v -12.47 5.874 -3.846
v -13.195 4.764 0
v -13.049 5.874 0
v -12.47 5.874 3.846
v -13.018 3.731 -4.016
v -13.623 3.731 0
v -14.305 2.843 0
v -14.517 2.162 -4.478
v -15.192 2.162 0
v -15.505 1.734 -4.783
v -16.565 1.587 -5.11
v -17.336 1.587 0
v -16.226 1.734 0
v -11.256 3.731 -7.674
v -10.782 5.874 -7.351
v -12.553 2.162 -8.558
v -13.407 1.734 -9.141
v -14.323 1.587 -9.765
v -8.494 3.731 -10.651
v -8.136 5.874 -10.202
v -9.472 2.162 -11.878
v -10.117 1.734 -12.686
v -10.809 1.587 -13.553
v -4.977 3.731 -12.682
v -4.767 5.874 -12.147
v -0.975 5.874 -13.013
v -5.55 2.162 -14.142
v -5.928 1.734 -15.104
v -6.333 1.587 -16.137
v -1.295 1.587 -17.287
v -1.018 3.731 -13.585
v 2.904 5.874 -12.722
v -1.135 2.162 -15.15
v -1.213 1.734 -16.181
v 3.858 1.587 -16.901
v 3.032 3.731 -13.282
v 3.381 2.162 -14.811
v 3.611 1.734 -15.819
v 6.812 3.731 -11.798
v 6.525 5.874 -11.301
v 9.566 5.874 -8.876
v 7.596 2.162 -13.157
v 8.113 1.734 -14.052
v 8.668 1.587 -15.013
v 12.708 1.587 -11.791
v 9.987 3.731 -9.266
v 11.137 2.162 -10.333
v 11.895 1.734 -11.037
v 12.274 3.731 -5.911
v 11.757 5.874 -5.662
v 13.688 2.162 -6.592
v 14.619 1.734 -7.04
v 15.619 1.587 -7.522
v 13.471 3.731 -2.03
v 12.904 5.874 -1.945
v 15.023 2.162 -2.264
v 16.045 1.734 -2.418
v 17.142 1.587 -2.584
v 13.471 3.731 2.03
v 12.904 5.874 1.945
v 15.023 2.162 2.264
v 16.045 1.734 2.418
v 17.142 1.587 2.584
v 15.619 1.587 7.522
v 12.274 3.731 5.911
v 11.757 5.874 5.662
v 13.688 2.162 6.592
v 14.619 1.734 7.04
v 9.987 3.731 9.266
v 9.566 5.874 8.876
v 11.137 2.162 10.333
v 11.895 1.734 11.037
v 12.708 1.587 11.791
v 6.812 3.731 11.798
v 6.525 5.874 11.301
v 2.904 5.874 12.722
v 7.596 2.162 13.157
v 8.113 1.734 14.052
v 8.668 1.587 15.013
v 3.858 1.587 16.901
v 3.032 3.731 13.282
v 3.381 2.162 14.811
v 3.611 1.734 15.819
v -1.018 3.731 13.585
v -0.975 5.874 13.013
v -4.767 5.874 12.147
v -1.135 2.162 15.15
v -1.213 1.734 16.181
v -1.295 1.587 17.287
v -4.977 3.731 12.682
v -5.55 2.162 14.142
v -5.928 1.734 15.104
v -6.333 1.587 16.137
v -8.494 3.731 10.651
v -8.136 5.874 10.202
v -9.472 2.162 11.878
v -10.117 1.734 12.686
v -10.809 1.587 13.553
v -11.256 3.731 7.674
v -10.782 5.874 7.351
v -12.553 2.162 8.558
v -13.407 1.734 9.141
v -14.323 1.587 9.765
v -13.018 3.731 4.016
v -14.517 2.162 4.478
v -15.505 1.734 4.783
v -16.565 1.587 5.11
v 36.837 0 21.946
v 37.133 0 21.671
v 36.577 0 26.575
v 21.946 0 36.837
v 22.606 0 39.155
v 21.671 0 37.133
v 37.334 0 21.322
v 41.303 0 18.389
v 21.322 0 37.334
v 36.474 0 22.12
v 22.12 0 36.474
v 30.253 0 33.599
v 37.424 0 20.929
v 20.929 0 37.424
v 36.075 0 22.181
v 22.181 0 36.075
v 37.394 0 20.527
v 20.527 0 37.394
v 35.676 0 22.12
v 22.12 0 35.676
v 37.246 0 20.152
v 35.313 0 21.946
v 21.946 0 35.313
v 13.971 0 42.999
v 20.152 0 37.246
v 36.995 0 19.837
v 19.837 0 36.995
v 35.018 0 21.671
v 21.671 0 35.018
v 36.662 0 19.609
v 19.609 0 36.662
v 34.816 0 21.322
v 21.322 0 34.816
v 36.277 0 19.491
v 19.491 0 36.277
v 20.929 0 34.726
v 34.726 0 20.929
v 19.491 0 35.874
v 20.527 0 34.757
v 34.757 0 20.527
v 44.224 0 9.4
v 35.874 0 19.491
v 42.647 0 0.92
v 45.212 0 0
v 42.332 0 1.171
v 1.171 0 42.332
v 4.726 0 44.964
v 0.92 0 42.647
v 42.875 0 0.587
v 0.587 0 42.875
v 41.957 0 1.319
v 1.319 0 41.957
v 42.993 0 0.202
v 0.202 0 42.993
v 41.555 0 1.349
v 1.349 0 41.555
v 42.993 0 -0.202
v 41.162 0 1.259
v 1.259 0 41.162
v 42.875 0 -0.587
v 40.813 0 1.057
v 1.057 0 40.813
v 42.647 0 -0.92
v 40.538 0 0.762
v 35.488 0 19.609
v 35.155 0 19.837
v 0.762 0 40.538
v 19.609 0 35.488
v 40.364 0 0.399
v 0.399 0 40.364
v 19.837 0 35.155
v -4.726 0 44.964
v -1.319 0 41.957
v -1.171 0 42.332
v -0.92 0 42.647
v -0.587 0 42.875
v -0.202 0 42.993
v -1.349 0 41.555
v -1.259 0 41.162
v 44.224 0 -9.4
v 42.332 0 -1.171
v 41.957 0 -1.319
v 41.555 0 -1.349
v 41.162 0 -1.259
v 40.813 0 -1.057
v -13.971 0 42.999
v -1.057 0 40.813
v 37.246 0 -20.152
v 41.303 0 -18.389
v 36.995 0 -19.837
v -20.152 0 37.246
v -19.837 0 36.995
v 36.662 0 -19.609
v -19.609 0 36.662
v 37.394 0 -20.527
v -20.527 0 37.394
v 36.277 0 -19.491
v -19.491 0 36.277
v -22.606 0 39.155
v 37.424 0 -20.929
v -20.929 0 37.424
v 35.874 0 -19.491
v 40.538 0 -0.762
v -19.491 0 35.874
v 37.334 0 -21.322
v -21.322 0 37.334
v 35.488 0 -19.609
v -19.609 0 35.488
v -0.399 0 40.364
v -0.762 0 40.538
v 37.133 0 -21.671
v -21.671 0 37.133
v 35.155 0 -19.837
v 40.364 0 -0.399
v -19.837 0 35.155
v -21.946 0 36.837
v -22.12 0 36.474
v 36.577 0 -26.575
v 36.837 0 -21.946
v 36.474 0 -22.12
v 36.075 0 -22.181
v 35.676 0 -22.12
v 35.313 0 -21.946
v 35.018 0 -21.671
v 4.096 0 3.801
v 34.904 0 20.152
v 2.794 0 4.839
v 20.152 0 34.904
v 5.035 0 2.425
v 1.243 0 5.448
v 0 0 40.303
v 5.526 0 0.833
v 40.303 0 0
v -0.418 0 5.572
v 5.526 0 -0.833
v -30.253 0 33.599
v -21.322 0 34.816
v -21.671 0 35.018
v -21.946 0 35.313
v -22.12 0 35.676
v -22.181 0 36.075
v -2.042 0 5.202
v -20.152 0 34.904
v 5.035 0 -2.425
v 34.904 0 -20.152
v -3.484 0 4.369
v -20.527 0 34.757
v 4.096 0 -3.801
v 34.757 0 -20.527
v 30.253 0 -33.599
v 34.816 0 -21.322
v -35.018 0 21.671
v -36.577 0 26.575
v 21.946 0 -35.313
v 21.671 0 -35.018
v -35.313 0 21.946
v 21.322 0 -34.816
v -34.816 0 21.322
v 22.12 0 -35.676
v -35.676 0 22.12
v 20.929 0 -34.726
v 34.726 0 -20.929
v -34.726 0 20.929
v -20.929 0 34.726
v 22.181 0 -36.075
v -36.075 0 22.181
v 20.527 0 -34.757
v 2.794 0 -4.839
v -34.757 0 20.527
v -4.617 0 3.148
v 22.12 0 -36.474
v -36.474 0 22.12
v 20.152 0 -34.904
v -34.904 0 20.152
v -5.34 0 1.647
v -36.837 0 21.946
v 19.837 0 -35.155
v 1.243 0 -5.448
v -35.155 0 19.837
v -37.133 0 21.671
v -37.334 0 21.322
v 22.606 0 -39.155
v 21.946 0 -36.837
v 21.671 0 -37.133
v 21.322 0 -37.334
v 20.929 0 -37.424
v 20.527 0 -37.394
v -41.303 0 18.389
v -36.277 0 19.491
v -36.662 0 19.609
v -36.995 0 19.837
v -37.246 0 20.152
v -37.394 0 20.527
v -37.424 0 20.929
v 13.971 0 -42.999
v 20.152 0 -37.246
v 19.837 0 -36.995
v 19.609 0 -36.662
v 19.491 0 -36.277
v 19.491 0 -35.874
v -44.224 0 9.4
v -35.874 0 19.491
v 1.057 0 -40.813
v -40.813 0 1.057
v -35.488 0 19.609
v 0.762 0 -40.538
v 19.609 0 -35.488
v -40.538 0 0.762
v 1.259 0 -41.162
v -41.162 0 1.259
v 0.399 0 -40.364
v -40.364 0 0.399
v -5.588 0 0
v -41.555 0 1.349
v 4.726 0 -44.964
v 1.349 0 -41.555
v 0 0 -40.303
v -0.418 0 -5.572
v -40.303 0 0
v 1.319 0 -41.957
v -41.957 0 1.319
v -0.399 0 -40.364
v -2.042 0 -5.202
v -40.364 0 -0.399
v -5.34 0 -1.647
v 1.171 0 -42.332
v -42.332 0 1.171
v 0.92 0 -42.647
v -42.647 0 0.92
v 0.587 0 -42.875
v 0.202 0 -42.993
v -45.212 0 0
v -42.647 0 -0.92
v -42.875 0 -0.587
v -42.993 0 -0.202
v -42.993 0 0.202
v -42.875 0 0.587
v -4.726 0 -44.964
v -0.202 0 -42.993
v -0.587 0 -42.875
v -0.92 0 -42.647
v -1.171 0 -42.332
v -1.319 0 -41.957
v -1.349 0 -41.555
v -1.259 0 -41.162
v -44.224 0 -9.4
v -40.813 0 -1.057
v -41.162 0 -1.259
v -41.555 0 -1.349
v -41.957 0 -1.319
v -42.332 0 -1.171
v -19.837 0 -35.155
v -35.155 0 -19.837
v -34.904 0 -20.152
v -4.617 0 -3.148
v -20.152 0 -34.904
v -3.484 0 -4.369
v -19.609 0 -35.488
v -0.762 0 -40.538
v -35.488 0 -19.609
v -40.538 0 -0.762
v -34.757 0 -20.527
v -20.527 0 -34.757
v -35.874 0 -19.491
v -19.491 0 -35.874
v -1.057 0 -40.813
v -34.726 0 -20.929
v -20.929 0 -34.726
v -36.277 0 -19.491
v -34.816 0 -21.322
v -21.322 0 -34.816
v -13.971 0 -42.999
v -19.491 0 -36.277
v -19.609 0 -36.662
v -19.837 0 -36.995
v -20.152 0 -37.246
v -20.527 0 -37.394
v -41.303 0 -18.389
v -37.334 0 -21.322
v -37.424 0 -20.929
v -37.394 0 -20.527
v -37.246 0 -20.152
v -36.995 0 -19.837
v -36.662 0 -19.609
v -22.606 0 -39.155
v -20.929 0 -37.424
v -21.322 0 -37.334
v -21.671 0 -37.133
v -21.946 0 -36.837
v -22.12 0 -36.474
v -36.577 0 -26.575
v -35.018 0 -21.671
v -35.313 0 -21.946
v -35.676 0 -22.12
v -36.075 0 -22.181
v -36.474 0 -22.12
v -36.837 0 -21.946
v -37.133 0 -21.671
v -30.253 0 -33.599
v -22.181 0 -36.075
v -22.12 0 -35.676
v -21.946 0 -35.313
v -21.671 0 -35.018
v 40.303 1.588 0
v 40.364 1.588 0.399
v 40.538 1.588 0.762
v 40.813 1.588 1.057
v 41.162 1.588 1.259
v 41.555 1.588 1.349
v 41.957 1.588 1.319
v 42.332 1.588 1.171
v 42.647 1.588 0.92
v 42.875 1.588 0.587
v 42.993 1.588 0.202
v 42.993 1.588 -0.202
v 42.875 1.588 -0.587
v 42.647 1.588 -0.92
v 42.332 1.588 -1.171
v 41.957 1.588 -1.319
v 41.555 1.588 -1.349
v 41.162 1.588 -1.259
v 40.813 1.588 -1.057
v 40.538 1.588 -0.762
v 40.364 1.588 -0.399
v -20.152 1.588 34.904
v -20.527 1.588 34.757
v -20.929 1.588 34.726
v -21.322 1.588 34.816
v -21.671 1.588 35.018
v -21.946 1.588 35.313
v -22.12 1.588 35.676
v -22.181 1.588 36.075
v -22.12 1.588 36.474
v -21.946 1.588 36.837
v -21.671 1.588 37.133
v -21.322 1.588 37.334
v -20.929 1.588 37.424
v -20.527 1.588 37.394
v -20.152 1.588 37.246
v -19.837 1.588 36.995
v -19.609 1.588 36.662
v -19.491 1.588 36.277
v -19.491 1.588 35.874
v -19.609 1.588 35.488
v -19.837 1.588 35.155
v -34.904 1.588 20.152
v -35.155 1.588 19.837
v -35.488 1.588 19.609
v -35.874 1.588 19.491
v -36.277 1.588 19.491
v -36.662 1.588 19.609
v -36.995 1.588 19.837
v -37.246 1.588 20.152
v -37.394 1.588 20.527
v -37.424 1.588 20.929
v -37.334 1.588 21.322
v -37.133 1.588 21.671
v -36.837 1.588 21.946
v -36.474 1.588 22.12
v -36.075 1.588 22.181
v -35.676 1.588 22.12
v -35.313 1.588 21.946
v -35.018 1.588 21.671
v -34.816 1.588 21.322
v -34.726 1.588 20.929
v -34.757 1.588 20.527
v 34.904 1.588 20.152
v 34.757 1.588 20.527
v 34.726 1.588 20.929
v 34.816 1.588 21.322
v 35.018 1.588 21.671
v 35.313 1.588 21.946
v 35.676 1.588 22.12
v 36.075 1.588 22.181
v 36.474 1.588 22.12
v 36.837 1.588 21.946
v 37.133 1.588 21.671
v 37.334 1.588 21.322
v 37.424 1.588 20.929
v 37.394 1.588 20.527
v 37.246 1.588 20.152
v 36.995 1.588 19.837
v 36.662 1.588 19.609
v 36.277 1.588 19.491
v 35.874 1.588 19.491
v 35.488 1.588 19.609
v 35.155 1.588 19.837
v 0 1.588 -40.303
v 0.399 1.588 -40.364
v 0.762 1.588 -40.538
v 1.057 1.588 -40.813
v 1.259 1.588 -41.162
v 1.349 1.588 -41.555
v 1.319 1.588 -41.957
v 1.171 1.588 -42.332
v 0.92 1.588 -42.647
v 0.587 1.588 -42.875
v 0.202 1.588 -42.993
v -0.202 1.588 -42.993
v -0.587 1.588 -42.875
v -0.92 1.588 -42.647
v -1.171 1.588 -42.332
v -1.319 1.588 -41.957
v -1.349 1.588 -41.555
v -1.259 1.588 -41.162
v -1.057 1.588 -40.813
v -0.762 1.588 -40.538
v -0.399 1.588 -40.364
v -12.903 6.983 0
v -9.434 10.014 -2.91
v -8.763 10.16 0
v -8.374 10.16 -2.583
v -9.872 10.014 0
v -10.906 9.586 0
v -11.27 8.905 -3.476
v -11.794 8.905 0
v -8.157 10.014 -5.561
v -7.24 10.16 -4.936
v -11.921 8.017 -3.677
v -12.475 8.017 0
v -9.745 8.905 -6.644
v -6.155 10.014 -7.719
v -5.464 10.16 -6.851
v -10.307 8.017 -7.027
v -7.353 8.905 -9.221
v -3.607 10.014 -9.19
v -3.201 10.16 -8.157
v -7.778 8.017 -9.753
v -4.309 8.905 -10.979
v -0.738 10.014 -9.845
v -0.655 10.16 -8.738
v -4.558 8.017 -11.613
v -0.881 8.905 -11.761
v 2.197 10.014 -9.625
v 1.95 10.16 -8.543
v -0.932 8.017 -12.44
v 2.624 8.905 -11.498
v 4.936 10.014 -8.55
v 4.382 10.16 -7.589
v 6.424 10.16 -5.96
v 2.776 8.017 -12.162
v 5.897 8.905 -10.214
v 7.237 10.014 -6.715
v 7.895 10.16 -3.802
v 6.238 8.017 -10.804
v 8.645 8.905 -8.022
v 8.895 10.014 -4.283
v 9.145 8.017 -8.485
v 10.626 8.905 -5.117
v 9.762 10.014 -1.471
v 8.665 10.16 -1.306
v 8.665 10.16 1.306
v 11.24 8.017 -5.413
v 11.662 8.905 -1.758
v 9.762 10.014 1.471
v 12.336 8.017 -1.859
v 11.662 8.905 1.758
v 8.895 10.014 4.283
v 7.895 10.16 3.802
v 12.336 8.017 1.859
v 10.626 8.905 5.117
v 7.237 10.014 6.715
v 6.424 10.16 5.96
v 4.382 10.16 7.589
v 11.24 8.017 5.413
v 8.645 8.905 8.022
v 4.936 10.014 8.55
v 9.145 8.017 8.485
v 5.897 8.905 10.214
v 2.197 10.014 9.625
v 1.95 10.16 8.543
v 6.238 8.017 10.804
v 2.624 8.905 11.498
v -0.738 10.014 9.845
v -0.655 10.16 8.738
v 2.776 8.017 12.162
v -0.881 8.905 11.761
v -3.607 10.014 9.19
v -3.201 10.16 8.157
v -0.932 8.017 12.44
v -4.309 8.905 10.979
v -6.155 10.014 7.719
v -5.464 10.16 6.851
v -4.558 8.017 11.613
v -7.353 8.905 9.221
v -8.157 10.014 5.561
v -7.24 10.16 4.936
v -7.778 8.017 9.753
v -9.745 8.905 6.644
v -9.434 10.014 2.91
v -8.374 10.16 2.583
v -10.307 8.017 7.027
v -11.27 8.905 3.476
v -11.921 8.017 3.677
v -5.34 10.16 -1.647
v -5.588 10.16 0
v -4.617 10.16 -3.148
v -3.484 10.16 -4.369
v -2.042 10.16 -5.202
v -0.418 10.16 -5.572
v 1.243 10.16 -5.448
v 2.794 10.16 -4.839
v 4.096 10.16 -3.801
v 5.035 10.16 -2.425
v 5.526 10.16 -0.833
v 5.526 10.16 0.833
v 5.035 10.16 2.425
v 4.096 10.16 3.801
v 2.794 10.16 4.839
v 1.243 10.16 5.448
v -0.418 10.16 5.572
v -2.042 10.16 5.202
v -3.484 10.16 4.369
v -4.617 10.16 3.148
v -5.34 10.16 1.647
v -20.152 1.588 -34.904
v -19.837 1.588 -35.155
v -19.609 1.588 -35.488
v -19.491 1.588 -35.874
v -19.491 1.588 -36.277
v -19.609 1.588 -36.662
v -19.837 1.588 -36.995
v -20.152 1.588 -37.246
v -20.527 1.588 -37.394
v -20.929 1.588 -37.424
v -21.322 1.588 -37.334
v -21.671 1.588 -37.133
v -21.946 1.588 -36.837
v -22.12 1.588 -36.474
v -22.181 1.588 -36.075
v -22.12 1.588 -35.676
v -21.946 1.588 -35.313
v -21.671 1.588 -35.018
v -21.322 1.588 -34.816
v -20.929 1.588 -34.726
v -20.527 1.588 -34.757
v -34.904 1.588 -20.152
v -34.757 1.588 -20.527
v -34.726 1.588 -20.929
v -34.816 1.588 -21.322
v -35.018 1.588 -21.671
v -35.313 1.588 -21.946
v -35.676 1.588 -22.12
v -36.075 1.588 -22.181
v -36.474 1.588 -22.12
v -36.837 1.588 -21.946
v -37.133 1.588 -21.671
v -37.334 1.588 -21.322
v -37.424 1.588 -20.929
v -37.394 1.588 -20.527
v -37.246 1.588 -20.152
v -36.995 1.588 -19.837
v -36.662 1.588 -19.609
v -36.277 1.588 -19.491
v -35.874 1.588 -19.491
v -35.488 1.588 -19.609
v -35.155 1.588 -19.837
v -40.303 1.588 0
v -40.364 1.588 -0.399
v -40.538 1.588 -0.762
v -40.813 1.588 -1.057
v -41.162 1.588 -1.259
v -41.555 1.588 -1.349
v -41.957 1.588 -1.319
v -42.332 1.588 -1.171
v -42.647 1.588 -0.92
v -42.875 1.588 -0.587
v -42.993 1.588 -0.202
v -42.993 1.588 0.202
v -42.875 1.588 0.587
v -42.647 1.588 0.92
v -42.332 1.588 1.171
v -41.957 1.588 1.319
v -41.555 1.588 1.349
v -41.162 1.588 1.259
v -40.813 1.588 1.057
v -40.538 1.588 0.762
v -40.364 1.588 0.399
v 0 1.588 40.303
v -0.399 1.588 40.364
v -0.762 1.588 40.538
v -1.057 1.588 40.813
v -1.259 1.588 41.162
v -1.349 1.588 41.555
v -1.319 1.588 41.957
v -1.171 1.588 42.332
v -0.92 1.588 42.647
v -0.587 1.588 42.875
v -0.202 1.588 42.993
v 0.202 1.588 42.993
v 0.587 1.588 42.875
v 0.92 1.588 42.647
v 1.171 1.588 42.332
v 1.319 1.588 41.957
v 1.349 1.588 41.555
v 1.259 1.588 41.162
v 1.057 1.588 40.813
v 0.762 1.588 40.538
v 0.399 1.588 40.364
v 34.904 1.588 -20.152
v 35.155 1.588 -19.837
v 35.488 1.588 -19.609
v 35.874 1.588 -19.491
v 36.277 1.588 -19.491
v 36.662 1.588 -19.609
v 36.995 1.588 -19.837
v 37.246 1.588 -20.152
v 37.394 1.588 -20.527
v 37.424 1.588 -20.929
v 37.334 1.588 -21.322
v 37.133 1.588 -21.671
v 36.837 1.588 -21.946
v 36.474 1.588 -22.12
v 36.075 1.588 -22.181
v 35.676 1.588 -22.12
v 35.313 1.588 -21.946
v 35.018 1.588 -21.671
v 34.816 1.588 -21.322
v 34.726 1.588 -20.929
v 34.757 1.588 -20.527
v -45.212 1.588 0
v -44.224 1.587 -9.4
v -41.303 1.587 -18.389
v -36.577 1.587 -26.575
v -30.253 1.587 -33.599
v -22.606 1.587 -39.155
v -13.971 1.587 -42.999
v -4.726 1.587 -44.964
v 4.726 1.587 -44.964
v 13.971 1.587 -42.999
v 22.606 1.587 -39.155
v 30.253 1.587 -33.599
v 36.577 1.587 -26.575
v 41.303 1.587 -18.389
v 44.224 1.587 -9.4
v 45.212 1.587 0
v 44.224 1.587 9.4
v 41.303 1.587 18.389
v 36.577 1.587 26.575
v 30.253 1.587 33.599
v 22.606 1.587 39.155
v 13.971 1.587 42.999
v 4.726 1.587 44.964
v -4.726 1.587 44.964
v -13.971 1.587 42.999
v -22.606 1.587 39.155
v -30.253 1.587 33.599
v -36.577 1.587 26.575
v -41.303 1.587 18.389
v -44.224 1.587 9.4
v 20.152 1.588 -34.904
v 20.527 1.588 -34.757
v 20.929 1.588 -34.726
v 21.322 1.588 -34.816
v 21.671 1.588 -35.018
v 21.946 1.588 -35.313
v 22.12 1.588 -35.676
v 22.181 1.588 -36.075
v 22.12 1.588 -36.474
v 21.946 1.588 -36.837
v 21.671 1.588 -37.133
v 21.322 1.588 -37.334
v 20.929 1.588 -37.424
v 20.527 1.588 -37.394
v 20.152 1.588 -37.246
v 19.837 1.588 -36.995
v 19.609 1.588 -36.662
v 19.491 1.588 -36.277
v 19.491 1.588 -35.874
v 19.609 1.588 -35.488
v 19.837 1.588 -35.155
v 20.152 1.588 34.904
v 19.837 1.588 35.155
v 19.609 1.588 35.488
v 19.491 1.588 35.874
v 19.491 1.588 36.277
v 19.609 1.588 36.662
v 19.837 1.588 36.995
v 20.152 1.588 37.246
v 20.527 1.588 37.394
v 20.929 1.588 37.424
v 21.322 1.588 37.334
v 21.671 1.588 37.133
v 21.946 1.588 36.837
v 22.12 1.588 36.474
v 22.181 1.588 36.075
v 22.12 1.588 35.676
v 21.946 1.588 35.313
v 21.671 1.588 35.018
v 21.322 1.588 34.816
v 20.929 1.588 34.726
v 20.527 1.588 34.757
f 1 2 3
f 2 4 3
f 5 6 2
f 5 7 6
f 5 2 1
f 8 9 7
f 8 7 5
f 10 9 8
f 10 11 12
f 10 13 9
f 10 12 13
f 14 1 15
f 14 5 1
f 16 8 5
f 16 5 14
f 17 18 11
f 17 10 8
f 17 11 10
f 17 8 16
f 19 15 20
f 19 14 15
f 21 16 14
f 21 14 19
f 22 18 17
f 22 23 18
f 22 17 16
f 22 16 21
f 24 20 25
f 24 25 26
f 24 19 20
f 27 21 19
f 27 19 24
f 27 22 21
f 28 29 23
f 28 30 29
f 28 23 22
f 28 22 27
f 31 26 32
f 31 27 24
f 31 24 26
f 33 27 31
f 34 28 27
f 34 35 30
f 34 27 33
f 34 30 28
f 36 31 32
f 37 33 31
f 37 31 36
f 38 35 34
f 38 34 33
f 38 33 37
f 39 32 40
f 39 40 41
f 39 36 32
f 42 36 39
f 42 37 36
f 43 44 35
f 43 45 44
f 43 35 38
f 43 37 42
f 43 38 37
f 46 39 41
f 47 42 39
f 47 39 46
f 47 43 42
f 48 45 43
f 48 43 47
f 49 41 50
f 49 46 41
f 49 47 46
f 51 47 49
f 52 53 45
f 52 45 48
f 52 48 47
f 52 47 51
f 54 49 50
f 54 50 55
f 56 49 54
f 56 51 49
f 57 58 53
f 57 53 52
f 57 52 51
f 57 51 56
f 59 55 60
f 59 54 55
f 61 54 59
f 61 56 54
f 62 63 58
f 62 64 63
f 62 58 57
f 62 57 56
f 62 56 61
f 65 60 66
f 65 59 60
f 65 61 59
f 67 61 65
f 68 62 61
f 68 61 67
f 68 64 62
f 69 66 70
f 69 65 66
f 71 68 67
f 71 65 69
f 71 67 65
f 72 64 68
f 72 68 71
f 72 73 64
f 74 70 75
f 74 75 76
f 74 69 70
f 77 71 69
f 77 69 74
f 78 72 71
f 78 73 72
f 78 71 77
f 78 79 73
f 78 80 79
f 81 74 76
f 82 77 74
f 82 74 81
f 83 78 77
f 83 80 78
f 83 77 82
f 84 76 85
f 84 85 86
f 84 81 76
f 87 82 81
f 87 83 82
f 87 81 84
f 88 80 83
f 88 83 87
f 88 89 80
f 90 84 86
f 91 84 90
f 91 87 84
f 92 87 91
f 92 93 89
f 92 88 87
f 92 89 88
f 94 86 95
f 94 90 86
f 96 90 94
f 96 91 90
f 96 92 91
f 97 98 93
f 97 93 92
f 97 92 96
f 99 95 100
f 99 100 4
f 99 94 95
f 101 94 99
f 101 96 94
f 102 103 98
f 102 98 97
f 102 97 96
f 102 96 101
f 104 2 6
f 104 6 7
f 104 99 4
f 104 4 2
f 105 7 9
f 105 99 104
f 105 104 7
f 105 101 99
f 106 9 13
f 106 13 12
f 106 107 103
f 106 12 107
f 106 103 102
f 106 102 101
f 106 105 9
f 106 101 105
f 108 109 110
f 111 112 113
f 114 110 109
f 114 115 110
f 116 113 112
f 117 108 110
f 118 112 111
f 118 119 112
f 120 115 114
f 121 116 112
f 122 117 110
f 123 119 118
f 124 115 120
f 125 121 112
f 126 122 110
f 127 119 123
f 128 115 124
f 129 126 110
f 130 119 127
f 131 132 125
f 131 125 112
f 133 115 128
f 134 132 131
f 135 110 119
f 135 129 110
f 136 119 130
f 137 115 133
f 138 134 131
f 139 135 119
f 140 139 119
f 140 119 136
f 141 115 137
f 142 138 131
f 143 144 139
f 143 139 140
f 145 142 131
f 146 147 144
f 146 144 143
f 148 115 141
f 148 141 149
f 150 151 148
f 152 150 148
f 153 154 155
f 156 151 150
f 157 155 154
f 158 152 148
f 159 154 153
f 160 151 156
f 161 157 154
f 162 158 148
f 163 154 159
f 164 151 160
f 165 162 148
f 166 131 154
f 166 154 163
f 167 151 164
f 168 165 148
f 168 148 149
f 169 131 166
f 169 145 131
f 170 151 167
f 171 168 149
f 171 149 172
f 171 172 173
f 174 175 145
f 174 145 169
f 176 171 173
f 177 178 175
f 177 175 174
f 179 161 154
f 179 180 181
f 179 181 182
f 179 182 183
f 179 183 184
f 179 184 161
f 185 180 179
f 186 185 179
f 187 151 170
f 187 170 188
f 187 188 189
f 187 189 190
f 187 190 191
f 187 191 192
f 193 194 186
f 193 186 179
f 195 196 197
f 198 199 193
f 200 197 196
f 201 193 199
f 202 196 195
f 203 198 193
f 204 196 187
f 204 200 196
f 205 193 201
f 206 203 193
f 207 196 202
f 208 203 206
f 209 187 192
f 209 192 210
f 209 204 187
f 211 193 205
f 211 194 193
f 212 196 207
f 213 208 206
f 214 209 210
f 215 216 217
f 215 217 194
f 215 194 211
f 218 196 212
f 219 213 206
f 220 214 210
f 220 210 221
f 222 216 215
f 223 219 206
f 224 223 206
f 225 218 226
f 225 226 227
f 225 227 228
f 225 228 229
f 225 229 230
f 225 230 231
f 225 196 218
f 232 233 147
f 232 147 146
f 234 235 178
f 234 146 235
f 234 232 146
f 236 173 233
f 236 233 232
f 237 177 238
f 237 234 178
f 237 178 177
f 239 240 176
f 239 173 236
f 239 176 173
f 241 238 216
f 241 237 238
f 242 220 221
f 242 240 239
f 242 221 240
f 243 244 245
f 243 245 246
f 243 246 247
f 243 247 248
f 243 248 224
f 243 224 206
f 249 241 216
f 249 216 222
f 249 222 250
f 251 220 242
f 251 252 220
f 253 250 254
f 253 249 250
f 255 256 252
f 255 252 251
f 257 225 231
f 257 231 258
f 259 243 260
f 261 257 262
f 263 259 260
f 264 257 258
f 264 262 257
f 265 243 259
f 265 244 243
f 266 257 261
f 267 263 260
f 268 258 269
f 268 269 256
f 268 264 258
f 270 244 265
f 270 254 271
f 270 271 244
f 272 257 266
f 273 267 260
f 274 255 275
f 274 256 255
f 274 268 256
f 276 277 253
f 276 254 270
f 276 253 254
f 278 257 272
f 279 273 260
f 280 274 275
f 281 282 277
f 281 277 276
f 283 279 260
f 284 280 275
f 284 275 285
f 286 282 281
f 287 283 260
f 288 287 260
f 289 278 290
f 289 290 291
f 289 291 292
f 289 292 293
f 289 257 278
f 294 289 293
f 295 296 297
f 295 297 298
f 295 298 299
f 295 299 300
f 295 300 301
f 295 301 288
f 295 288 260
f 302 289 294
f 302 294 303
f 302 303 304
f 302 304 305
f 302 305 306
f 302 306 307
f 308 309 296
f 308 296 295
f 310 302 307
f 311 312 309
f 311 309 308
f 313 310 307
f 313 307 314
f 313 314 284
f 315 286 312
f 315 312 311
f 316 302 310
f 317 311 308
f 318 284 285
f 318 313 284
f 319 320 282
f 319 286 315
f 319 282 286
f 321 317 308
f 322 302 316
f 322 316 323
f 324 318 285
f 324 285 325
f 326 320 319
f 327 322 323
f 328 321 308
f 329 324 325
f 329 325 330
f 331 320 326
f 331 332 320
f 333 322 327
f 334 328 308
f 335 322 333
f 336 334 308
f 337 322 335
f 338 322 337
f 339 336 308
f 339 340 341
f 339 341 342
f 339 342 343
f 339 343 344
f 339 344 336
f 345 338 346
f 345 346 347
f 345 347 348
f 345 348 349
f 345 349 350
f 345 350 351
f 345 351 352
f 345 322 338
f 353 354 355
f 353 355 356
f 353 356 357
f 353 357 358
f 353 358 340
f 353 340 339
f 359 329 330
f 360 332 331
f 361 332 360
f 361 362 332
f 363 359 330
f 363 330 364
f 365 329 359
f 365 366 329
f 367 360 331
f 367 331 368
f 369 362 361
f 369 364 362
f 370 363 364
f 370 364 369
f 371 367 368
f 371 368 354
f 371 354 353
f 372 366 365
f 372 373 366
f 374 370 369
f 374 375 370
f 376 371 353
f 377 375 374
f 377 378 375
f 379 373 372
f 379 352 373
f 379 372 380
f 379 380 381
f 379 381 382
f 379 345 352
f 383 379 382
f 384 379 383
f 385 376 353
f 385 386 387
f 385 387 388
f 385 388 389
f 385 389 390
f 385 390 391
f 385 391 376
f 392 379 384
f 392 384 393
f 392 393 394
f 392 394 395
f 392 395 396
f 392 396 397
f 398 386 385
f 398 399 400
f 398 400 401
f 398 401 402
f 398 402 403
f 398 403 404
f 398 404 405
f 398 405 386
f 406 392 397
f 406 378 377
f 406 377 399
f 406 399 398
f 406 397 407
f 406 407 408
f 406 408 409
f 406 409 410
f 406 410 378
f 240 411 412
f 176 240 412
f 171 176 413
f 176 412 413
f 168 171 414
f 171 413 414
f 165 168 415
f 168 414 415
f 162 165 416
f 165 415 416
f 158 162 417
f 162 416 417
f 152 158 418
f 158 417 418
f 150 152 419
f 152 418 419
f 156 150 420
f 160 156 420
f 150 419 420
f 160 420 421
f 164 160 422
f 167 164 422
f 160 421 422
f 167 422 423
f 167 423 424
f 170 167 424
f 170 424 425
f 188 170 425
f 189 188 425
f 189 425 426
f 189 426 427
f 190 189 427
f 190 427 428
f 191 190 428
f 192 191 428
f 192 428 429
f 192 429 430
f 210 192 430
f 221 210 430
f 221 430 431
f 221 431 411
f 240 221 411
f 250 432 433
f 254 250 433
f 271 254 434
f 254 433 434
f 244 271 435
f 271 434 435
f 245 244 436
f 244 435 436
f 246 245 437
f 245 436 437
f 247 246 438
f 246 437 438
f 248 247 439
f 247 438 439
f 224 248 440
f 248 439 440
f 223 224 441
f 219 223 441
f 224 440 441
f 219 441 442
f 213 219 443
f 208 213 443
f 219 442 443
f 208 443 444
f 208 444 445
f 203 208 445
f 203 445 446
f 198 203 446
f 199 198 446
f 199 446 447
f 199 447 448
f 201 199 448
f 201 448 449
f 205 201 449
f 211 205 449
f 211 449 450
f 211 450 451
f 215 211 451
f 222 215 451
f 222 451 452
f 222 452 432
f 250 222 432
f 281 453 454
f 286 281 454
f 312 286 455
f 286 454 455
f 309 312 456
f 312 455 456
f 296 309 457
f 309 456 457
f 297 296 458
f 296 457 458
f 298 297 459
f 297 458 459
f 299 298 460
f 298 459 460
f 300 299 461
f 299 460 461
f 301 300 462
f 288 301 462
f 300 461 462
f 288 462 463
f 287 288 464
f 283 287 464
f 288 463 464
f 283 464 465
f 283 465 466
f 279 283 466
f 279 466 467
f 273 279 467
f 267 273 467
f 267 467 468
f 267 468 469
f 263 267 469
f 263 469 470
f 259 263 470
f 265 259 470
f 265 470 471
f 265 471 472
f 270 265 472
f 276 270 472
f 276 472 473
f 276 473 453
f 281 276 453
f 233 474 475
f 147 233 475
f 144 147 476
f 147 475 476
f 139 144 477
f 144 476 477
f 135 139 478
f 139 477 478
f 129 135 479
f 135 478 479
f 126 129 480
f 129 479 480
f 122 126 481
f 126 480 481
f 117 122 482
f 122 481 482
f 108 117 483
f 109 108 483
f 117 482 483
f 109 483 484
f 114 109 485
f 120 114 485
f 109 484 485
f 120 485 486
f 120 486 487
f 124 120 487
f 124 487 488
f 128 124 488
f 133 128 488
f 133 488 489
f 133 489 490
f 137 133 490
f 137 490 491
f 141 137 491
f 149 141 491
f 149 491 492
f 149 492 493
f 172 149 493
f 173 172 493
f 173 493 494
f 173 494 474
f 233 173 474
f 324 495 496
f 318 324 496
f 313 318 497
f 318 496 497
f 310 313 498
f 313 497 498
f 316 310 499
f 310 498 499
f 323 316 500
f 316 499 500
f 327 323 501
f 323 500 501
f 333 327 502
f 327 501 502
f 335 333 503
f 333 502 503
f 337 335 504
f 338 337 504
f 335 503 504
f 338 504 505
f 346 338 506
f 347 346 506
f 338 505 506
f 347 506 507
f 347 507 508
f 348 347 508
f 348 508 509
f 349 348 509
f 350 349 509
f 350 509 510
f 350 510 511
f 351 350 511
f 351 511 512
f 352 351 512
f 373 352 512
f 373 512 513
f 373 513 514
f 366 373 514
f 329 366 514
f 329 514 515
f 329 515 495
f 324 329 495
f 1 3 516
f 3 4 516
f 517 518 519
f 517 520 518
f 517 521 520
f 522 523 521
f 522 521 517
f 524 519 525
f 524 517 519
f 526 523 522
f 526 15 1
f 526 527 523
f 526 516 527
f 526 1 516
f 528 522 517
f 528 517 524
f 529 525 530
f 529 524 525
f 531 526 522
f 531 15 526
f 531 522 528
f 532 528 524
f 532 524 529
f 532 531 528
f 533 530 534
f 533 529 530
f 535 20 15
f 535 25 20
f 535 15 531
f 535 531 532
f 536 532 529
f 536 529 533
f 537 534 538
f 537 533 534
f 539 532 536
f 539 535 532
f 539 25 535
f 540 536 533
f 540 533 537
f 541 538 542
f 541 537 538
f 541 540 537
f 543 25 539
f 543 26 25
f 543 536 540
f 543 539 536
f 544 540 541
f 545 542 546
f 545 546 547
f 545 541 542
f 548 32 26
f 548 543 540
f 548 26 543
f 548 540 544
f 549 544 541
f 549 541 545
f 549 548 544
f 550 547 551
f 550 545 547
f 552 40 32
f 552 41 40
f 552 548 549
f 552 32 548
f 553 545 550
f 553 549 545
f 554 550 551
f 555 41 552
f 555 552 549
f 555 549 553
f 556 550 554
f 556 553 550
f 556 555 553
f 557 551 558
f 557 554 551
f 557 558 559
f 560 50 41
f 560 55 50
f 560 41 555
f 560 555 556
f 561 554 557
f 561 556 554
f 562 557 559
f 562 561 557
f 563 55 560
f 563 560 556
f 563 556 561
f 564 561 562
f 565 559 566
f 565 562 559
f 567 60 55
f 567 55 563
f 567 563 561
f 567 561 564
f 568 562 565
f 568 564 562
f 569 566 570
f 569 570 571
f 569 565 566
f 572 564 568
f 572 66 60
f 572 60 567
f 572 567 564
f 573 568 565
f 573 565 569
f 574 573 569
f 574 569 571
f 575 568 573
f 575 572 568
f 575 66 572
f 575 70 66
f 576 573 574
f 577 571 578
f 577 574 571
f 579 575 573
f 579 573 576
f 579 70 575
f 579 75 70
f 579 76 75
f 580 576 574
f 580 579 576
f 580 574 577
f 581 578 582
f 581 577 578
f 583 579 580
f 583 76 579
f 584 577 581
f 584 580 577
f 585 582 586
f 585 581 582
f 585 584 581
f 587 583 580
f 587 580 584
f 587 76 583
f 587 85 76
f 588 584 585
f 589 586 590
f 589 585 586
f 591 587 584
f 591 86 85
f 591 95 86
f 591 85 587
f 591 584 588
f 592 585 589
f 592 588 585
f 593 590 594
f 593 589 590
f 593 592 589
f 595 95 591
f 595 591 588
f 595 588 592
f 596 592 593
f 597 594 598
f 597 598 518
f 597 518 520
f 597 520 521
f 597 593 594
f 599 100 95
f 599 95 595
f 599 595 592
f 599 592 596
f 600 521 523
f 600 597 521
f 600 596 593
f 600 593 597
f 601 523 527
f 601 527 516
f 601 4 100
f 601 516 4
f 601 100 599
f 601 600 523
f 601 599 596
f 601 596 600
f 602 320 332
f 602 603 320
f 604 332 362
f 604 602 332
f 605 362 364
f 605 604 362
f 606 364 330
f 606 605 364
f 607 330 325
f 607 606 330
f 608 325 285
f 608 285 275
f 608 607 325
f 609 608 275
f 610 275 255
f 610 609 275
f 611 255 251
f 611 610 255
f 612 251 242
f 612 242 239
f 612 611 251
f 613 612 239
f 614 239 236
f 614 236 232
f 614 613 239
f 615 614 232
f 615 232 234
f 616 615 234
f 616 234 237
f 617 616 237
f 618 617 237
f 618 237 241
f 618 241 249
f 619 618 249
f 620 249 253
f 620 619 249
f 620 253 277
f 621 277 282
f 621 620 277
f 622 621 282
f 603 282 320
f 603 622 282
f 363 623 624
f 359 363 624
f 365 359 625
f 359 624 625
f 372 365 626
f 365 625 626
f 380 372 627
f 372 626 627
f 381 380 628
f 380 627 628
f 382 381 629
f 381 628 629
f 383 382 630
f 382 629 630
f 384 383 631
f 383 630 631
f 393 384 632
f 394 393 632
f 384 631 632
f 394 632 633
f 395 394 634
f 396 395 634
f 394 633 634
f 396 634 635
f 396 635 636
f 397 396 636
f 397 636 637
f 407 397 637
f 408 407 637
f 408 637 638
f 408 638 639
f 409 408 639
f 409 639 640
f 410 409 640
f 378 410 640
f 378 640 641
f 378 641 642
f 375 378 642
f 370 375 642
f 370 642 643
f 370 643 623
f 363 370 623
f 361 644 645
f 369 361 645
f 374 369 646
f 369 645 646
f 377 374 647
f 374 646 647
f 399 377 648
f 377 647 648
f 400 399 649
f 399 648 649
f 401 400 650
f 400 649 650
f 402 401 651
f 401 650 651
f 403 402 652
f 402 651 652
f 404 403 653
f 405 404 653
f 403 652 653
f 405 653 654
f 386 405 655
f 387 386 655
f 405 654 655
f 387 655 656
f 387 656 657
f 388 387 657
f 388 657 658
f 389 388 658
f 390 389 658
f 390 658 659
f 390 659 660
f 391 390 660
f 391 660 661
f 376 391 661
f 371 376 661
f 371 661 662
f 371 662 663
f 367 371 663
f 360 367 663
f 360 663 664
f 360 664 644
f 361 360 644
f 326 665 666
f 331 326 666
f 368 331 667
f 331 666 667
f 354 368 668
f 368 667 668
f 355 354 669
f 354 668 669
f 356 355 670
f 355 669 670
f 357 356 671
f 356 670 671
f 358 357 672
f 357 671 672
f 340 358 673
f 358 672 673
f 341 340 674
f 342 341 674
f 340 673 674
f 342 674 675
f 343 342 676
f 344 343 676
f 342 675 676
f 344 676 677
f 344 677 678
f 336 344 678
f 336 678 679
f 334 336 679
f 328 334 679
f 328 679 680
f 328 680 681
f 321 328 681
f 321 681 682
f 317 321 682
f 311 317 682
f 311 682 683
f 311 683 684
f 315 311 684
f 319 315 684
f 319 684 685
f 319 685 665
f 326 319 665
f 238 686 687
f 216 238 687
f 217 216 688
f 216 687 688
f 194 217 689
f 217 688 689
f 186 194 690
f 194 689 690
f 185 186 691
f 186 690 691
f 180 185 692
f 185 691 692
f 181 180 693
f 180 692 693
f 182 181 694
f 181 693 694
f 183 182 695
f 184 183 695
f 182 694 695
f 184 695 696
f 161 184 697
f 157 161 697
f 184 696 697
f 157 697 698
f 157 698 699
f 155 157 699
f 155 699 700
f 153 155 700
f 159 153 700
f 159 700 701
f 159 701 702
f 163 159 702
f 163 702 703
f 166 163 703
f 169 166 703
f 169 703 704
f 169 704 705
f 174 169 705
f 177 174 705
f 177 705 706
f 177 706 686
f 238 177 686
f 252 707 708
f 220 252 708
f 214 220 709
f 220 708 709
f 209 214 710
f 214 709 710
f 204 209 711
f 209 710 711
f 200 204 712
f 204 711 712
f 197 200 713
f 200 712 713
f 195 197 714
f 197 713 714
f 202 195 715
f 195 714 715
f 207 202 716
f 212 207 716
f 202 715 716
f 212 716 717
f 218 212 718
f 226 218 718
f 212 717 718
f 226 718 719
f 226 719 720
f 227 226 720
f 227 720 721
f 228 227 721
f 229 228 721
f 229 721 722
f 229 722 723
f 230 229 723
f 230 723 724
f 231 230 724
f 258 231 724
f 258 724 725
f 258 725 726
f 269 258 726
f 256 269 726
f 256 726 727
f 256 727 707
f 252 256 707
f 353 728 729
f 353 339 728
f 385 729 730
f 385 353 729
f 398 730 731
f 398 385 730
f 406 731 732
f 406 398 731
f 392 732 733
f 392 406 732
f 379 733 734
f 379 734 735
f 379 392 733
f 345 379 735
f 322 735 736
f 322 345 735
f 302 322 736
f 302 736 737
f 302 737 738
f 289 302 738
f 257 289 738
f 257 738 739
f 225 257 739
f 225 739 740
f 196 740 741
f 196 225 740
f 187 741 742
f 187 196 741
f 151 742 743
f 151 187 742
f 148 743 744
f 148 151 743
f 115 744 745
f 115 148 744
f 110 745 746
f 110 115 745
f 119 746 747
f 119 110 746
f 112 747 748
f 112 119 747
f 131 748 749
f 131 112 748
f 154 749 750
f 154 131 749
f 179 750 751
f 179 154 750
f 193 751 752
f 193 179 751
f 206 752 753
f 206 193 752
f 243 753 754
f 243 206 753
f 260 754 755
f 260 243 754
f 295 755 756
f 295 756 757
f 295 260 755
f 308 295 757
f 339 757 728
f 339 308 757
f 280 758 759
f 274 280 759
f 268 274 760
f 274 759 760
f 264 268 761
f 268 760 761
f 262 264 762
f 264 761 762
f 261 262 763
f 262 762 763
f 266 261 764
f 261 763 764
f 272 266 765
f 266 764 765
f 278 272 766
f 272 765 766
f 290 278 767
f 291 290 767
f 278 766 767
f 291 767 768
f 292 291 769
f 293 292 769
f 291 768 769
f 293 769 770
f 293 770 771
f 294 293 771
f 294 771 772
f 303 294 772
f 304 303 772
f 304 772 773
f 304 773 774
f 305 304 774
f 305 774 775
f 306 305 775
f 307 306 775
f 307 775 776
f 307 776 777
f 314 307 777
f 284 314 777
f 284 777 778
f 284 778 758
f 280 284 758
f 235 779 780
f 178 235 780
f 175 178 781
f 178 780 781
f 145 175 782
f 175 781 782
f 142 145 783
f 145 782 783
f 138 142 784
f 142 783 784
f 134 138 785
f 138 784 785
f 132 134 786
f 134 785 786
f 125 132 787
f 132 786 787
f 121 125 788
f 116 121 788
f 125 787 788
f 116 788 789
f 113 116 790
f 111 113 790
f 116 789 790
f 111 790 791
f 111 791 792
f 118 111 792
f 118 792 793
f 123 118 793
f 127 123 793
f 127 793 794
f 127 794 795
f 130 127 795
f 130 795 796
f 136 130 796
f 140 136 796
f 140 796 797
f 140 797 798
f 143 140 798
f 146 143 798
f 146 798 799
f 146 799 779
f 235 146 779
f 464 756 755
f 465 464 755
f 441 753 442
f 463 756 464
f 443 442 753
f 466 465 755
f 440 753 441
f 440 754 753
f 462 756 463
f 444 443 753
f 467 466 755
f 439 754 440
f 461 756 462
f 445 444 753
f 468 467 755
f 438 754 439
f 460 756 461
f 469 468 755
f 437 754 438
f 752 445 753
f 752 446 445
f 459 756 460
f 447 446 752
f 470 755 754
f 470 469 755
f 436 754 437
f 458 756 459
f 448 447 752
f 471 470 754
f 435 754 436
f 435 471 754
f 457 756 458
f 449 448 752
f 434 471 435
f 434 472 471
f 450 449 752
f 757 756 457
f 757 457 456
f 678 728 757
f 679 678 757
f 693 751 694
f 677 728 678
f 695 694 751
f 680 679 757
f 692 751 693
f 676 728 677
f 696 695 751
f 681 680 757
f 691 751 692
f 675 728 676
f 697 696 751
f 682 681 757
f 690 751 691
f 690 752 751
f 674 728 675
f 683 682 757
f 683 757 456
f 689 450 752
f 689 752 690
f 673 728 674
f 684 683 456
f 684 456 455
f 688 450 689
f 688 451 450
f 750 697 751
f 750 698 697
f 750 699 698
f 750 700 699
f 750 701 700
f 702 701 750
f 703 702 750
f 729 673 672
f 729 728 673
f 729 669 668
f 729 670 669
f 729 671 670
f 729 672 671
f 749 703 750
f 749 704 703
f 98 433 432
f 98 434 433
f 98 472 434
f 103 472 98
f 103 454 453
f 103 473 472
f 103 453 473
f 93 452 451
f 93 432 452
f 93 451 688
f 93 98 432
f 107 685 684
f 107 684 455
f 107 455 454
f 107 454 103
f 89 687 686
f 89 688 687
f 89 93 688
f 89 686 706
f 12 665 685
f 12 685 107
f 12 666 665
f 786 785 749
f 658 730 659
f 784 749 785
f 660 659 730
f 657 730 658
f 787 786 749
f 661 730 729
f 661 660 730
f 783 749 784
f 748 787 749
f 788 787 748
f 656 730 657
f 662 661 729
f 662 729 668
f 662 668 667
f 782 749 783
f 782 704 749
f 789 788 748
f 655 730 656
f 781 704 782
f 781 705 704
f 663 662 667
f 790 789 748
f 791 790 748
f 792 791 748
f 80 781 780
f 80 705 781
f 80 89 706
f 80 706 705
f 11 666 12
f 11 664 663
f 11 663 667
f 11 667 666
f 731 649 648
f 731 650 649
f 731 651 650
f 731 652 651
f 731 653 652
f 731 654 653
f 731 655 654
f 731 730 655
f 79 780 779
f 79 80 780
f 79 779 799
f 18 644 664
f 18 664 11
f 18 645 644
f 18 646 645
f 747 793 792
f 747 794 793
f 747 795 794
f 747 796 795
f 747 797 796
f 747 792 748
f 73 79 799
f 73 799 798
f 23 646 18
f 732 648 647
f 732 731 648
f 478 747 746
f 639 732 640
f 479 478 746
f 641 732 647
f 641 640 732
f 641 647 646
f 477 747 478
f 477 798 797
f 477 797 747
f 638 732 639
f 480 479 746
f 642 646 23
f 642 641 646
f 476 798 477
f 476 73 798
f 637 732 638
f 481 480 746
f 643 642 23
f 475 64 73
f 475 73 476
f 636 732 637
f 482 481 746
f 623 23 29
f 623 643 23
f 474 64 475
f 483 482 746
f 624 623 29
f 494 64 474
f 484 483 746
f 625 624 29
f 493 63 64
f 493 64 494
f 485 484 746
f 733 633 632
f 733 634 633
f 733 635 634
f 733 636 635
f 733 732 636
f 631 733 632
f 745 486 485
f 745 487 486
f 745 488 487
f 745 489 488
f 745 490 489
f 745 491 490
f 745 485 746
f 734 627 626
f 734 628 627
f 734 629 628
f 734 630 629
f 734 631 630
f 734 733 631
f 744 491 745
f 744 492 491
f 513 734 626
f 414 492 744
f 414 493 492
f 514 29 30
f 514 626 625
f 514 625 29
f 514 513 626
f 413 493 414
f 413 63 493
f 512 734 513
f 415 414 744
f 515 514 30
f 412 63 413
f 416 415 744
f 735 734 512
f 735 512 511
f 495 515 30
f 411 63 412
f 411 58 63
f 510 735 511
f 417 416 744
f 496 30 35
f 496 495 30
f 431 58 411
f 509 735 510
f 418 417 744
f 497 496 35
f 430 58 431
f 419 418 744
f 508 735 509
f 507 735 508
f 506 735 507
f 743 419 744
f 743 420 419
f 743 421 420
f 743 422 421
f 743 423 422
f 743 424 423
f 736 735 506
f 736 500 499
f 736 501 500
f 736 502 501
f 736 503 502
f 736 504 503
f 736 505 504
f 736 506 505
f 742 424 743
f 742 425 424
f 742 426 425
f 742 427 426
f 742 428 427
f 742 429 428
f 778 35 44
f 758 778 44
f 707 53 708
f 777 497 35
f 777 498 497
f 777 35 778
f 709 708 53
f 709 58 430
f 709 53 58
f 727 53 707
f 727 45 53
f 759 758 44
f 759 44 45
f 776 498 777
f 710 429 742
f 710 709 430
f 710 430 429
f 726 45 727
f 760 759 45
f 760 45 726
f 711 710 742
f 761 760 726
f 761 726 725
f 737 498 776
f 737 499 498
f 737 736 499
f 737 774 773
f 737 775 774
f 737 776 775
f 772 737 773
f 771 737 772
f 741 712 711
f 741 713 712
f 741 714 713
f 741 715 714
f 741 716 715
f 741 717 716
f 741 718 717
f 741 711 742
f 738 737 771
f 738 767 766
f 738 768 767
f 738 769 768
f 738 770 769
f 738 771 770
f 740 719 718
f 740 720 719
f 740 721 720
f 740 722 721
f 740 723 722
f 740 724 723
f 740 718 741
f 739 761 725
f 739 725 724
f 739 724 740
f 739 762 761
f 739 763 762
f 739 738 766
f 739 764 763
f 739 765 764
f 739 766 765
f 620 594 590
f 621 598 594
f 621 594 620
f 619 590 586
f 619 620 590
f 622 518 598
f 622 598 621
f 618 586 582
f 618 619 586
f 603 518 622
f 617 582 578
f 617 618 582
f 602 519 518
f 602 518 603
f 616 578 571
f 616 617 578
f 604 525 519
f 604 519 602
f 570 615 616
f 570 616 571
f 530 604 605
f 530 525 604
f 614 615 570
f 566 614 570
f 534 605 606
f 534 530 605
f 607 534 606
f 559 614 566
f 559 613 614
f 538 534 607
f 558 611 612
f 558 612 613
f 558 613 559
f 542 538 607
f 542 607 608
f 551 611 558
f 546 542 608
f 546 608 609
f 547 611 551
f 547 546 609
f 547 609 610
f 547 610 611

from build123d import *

# Parameters (mm, degrees)
F_36_0_1065_DIAMETER_HOLE1_D = 2.7051
CIRPATTERN1_COUNT            = 12


with BuildPart() as part:
    # Sketch1 → Revolve1 (revolve)
    with BuildSketch(Plane.XY):
        with BuildLine():
            Line((-45.212, 0), (-5.588, 0))
            Line((-5.588, 0), (-5.588, 10.16))
            Line((-5.588, 10.16), (-8.763, 10.16))
            ThreePointArc((-8.763, 10.16), (-11.793836441, 8.904586441), (-13.04925, 5.87375))
            ThreePointArc((-13.04925, 5.87375), (-14.304663559, 2.842913559), (-17.3355, 1.5875))
            Line((-17.3355, 1.5875), (-45.212, 1.5875))
            Line((-45.212, 1.5875), (-45.212, 0))
        make_face()
    revolve(axis=Axis((0, 55, 0), (0, -1, 0)))

    # #36 (0.1065) Diameter Hole1 (through all)
    with Locations(Plane(origin=(0, 0, 0), x_dir=(-1, 0, 0), z_dir=(0, -1, 0))):
        with Locations((41.656, 0)):
            f_36_0_1065_diameter_hole1 = Hole(F_36_0_1065_DIAMETER_HOLE1_D / 2)

    # CirPattern1: #36 (0.1065) Diameter Hole1 ×12 about axis
    cirpattern1_axis = Axis((0, 0, 0), (0, 1, 0))
    for i in range(1, CIRPATTERN1_COUNT):
        add(f_36_0_1065_diameter_hole1.rotate(cirpattern1_axis, i * 360 / CIRPATTERN1_COUNT), mode=Mode.SUBTRACT)


solid = part.part
